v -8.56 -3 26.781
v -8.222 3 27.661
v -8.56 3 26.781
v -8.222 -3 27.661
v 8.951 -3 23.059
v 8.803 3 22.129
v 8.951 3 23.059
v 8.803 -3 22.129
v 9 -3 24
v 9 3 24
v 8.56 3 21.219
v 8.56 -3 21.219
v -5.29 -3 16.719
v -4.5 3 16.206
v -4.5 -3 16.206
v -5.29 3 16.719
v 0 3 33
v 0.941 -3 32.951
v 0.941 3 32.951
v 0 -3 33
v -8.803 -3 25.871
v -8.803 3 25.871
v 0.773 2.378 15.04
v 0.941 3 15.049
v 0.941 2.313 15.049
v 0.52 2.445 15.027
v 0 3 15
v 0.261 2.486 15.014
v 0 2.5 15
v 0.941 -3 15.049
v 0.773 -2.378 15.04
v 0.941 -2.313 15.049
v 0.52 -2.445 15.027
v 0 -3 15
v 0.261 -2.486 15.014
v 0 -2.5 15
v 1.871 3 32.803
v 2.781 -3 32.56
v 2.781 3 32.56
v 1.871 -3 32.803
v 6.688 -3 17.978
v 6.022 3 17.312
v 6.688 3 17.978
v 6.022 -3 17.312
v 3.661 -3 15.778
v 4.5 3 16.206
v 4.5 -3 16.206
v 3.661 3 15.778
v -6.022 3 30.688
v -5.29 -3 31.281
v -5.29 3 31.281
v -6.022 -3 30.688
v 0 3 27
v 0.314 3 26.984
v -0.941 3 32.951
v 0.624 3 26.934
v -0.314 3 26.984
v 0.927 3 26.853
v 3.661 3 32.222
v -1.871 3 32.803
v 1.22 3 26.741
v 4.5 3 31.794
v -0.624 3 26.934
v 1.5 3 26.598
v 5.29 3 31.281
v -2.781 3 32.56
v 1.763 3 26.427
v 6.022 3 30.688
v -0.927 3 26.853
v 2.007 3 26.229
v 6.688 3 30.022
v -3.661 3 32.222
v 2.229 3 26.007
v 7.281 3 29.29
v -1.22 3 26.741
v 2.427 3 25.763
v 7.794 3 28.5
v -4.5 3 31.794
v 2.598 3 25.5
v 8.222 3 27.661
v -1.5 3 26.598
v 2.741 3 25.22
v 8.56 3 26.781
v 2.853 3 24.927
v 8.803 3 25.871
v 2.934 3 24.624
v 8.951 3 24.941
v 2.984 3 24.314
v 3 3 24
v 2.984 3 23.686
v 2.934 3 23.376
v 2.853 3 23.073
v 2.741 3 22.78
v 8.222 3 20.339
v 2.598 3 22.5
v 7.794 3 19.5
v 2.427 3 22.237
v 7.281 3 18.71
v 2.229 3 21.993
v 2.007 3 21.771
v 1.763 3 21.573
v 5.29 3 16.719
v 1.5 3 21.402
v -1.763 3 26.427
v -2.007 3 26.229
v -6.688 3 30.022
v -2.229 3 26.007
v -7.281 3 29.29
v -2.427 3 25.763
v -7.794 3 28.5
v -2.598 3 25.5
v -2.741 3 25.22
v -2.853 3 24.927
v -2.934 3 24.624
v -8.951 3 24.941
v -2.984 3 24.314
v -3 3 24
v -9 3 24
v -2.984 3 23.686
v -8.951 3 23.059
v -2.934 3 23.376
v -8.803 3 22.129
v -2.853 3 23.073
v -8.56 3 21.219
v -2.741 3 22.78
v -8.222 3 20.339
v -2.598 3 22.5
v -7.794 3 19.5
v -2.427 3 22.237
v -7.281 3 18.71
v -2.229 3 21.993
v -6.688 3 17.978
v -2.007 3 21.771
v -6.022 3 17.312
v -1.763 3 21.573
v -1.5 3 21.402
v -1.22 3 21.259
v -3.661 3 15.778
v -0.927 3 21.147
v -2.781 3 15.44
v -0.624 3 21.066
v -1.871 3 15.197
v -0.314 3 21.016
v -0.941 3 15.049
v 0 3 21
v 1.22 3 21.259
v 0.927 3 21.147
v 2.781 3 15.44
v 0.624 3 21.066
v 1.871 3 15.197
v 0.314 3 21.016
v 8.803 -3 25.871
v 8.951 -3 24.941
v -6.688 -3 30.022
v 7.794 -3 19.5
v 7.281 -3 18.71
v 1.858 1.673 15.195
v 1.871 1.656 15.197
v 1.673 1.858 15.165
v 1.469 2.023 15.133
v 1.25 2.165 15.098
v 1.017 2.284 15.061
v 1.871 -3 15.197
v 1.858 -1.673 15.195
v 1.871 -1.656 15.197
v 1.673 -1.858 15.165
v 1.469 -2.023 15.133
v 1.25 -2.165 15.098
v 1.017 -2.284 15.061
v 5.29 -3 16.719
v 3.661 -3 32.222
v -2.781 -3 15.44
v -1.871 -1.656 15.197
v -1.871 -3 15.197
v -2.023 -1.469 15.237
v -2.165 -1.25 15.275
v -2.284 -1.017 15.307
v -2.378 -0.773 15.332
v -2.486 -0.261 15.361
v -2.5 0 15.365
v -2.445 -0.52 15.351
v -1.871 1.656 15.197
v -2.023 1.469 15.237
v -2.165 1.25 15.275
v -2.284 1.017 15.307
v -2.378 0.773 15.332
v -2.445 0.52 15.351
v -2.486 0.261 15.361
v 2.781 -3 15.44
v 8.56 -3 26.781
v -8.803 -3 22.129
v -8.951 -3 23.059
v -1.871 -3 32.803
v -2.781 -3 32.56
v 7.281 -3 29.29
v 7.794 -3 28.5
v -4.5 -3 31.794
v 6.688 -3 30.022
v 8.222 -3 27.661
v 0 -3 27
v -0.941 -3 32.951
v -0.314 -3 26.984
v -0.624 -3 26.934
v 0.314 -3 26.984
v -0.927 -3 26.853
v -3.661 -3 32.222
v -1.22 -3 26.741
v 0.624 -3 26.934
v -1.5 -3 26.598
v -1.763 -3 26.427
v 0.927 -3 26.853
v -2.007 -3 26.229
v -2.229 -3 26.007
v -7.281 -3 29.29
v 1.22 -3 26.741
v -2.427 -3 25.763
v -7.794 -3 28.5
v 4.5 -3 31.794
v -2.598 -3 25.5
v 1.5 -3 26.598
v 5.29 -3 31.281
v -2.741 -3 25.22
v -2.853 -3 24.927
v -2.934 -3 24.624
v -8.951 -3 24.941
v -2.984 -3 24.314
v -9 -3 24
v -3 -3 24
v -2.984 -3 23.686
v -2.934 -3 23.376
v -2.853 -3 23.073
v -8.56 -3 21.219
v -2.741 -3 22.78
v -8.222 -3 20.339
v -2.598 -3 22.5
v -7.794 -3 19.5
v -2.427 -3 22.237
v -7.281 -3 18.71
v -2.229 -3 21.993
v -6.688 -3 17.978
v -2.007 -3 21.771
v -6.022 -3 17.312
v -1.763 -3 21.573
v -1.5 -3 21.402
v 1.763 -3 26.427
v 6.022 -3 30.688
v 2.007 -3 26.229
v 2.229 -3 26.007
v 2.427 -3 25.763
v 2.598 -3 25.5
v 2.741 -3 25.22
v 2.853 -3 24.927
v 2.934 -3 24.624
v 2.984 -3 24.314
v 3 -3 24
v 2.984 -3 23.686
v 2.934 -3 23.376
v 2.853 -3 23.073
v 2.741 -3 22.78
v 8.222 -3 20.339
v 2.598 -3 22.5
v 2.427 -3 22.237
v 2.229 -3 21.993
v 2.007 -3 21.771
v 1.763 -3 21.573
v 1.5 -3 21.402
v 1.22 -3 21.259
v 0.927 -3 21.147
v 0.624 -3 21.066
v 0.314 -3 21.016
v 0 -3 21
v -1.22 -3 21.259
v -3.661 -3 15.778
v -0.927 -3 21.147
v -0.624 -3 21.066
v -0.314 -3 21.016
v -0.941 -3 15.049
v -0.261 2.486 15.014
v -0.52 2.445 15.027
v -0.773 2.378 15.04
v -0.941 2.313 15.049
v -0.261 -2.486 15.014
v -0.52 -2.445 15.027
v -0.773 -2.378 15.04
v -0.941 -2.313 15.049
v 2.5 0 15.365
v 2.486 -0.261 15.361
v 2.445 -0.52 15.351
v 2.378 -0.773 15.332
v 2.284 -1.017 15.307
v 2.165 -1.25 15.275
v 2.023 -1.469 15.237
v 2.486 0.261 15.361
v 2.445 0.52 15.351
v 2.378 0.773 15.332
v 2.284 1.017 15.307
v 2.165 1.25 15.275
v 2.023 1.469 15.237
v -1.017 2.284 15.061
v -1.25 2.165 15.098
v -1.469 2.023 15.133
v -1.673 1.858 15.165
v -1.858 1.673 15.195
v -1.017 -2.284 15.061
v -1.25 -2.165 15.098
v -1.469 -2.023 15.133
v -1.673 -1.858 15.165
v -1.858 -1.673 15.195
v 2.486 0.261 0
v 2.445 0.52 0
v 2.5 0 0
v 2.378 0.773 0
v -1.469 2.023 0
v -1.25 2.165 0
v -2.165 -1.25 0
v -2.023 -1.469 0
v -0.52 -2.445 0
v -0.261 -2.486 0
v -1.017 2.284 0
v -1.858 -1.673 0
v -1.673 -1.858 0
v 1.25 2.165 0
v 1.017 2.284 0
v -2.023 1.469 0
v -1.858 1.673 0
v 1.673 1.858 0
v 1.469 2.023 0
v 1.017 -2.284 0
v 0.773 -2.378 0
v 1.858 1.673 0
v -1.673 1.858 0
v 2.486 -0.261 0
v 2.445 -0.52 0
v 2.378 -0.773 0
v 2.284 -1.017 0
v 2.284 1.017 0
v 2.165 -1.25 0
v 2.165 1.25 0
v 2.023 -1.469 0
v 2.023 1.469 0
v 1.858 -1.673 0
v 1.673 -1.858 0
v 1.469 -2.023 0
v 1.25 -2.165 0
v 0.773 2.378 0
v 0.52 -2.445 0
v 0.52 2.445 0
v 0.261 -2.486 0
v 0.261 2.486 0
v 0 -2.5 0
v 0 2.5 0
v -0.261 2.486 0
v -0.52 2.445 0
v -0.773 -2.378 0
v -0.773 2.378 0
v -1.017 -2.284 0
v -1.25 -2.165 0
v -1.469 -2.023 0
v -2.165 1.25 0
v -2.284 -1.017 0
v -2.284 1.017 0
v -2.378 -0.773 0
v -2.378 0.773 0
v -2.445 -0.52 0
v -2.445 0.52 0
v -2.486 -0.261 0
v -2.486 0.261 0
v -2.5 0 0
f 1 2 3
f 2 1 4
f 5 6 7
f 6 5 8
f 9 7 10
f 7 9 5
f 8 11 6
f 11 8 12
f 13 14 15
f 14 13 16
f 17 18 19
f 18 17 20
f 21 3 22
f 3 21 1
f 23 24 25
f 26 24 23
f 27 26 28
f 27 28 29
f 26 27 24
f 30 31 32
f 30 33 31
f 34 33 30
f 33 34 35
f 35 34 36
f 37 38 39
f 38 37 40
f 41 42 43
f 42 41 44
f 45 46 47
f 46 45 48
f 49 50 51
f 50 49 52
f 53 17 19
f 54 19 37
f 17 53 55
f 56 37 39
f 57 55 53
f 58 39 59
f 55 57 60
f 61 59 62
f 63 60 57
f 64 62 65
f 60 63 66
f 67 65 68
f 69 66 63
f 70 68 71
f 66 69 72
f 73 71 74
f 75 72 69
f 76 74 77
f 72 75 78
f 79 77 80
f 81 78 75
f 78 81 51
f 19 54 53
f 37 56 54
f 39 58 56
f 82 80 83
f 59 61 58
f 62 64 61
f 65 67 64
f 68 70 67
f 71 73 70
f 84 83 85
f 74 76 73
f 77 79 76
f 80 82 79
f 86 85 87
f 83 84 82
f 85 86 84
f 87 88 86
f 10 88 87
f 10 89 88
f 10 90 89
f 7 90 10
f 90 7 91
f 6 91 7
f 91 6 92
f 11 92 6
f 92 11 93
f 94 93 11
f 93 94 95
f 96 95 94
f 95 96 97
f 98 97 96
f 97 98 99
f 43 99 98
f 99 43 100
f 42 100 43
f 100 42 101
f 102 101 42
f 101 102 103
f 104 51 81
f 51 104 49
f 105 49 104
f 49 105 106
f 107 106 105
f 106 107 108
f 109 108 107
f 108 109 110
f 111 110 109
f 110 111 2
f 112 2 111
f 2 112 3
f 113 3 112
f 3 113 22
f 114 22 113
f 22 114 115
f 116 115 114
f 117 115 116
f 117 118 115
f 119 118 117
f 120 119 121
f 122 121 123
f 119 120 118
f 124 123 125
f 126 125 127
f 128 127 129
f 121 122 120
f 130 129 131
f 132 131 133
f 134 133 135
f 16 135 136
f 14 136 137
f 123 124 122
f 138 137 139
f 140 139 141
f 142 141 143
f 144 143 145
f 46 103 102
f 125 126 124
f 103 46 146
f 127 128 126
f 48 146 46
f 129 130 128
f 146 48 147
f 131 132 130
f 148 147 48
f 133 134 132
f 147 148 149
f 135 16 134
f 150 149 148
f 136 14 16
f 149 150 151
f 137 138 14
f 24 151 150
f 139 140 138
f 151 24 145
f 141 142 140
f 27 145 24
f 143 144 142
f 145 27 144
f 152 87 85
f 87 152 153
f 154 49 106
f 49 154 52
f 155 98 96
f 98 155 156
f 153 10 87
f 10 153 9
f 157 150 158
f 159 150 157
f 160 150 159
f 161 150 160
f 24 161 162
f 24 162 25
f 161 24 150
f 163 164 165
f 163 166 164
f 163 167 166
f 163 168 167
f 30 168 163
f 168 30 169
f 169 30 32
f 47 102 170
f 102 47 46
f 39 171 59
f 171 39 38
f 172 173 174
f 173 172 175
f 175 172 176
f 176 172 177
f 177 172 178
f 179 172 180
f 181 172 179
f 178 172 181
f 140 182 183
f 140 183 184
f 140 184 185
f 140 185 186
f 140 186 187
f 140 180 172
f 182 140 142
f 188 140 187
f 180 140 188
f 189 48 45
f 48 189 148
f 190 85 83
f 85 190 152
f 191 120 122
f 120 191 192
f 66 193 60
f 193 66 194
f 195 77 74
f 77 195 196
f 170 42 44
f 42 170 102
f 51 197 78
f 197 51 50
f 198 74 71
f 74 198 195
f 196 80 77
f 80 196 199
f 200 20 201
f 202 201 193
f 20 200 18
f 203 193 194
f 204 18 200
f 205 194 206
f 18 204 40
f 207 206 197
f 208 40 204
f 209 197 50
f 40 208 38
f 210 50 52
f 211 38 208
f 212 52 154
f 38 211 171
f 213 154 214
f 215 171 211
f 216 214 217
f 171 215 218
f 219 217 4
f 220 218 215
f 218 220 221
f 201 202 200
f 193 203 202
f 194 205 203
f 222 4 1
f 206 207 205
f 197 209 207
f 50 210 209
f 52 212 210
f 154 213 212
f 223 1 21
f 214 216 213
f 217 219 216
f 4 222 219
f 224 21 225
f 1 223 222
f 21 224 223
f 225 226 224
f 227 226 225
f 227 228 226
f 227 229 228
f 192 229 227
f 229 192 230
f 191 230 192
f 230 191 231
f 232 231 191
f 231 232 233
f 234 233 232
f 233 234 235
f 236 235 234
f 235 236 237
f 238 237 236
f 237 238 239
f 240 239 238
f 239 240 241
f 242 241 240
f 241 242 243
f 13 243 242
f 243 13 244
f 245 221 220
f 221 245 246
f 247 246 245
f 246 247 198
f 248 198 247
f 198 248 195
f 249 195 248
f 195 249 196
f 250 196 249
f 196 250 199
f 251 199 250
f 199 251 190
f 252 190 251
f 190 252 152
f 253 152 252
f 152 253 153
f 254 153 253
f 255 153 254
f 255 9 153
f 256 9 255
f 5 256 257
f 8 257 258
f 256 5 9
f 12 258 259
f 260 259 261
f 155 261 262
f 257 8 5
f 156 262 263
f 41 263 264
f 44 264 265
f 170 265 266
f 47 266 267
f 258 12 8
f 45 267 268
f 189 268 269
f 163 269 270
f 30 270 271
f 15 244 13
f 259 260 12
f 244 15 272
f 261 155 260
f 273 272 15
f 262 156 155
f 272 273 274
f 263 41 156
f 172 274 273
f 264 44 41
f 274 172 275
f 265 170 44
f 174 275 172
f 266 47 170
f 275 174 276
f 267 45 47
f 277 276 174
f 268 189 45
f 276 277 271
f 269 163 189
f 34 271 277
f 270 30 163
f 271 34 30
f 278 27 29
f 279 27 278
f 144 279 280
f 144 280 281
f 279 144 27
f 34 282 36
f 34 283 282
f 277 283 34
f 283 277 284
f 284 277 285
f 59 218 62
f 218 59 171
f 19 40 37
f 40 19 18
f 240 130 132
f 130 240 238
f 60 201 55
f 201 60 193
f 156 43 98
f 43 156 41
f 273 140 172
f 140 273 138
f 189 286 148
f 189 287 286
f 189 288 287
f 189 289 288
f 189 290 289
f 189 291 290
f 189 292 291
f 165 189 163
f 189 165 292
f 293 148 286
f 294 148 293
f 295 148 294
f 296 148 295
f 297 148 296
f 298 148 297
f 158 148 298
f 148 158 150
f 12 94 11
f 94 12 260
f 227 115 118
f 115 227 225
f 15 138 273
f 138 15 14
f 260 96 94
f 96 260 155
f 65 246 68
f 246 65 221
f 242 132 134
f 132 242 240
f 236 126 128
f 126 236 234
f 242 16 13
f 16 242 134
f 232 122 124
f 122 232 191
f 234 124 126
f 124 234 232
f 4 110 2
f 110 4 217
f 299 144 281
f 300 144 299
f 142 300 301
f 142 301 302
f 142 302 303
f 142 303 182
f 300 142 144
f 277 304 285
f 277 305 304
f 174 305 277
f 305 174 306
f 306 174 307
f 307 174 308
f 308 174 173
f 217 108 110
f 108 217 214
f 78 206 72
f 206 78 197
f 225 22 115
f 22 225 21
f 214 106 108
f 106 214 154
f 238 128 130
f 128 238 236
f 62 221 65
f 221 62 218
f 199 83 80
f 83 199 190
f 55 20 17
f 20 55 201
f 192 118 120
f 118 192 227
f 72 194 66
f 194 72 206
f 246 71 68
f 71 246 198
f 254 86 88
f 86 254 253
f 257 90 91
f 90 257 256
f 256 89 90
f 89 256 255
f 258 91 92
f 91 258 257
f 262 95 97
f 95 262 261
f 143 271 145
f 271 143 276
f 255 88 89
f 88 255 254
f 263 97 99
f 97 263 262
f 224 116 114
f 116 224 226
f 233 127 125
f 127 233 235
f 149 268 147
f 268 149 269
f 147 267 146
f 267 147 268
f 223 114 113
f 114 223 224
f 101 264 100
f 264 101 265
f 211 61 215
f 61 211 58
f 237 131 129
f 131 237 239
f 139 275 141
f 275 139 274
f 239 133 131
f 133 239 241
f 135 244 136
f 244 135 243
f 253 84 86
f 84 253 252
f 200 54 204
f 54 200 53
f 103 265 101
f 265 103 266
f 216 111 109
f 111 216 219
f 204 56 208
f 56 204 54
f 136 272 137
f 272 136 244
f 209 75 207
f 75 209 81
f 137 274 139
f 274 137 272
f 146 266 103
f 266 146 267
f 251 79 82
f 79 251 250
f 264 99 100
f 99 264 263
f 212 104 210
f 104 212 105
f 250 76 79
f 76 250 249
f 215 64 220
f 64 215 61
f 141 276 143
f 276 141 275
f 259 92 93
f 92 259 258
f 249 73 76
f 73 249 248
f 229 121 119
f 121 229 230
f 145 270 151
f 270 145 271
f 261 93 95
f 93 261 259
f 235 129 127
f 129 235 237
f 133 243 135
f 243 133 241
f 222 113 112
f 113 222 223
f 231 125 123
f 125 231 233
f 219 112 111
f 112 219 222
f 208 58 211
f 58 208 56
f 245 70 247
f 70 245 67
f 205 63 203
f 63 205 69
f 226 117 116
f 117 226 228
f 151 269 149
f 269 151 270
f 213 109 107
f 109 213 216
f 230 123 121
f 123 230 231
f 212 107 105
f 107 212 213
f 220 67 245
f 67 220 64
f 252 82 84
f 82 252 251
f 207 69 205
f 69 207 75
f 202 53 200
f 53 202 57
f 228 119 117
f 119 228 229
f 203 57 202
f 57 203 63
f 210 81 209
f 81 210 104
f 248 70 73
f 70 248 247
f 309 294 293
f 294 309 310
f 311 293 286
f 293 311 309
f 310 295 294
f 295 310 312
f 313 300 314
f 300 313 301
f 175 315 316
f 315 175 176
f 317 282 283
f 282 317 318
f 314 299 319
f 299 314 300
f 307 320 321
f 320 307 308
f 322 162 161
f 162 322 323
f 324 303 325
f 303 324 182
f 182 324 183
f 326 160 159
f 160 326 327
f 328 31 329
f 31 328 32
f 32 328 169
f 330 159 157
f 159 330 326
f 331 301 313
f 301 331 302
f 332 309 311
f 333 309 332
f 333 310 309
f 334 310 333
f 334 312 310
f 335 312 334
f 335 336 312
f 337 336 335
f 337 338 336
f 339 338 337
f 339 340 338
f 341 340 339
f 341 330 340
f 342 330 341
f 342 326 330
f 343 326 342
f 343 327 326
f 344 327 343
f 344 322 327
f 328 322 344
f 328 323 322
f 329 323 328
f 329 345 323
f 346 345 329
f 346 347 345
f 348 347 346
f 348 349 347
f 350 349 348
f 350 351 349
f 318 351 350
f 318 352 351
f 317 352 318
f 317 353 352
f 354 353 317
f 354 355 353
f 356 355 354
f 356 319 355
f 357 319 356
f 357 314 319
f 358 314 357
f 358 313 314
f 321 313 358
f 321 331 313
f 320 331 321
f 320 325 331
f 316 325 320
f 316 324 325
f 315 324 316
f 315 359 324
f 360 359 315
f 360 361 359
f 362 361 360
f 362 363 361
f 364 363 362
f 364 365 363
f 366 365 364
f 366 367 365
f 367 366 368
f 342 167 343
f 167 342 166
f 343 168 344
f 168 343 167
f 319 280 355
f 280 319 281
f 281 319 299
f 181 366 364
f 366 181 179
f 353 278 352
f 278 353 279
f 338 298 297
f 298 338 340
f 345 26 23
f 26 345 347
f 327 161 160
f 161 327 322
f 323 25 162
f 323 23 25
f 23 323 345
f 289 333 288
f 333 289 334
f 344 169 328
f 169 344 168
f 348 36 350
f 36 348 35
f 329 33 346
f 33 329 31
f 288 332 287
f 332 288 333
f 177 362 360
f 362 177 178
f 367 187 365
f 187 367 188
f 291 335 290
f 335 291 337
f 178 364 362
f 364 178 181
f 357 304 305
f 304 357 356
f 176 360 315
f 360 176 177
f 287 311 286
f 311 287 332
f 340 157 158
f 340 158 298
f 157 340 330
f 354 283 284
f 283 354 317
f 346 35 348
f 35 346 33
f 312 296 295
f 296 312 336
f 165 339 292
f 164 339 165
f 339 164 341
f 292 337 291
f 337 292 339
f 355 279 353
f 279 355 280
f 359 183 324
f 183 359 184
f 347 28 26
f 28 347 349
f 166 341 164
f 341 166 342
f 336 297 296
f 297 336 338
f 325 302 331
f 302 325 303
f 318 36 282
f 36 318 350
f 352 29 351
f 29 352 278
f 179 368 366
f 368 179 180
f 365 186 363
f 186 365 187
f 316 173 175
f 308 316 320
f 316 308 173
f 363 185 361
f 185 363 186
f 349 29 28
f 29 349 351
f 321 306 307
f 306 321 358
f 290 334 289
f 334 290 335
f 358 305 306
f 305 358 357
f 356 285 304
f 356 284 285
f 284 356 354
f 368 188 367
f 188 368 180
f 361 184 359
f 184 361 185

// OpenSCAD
// Flat-eye bolt with a smooth shaft.
$fn = 60;
eps = 0.02;
shaft_d = 5;
shaft_l = 16;
eye_outer_d = 18;
eye_inner_d = eye_outer_d - 2 * 6;
eye_t = 6;
module eye() {
    translate([0, -eye_t / 2, shaft_l + eye_outer_d / 2 - 1]) rotate([-90, 0, 0])
        difference() { cylinder(d = eye_outer_d, h = eye_t); translate([0, 0, -eps]) cylinder(d = eye_inner_d, h = eye_t + 2 * eps); }
}
union() { cylinder(d = shaft_d, h = shaft_l + 2); eye(); }
